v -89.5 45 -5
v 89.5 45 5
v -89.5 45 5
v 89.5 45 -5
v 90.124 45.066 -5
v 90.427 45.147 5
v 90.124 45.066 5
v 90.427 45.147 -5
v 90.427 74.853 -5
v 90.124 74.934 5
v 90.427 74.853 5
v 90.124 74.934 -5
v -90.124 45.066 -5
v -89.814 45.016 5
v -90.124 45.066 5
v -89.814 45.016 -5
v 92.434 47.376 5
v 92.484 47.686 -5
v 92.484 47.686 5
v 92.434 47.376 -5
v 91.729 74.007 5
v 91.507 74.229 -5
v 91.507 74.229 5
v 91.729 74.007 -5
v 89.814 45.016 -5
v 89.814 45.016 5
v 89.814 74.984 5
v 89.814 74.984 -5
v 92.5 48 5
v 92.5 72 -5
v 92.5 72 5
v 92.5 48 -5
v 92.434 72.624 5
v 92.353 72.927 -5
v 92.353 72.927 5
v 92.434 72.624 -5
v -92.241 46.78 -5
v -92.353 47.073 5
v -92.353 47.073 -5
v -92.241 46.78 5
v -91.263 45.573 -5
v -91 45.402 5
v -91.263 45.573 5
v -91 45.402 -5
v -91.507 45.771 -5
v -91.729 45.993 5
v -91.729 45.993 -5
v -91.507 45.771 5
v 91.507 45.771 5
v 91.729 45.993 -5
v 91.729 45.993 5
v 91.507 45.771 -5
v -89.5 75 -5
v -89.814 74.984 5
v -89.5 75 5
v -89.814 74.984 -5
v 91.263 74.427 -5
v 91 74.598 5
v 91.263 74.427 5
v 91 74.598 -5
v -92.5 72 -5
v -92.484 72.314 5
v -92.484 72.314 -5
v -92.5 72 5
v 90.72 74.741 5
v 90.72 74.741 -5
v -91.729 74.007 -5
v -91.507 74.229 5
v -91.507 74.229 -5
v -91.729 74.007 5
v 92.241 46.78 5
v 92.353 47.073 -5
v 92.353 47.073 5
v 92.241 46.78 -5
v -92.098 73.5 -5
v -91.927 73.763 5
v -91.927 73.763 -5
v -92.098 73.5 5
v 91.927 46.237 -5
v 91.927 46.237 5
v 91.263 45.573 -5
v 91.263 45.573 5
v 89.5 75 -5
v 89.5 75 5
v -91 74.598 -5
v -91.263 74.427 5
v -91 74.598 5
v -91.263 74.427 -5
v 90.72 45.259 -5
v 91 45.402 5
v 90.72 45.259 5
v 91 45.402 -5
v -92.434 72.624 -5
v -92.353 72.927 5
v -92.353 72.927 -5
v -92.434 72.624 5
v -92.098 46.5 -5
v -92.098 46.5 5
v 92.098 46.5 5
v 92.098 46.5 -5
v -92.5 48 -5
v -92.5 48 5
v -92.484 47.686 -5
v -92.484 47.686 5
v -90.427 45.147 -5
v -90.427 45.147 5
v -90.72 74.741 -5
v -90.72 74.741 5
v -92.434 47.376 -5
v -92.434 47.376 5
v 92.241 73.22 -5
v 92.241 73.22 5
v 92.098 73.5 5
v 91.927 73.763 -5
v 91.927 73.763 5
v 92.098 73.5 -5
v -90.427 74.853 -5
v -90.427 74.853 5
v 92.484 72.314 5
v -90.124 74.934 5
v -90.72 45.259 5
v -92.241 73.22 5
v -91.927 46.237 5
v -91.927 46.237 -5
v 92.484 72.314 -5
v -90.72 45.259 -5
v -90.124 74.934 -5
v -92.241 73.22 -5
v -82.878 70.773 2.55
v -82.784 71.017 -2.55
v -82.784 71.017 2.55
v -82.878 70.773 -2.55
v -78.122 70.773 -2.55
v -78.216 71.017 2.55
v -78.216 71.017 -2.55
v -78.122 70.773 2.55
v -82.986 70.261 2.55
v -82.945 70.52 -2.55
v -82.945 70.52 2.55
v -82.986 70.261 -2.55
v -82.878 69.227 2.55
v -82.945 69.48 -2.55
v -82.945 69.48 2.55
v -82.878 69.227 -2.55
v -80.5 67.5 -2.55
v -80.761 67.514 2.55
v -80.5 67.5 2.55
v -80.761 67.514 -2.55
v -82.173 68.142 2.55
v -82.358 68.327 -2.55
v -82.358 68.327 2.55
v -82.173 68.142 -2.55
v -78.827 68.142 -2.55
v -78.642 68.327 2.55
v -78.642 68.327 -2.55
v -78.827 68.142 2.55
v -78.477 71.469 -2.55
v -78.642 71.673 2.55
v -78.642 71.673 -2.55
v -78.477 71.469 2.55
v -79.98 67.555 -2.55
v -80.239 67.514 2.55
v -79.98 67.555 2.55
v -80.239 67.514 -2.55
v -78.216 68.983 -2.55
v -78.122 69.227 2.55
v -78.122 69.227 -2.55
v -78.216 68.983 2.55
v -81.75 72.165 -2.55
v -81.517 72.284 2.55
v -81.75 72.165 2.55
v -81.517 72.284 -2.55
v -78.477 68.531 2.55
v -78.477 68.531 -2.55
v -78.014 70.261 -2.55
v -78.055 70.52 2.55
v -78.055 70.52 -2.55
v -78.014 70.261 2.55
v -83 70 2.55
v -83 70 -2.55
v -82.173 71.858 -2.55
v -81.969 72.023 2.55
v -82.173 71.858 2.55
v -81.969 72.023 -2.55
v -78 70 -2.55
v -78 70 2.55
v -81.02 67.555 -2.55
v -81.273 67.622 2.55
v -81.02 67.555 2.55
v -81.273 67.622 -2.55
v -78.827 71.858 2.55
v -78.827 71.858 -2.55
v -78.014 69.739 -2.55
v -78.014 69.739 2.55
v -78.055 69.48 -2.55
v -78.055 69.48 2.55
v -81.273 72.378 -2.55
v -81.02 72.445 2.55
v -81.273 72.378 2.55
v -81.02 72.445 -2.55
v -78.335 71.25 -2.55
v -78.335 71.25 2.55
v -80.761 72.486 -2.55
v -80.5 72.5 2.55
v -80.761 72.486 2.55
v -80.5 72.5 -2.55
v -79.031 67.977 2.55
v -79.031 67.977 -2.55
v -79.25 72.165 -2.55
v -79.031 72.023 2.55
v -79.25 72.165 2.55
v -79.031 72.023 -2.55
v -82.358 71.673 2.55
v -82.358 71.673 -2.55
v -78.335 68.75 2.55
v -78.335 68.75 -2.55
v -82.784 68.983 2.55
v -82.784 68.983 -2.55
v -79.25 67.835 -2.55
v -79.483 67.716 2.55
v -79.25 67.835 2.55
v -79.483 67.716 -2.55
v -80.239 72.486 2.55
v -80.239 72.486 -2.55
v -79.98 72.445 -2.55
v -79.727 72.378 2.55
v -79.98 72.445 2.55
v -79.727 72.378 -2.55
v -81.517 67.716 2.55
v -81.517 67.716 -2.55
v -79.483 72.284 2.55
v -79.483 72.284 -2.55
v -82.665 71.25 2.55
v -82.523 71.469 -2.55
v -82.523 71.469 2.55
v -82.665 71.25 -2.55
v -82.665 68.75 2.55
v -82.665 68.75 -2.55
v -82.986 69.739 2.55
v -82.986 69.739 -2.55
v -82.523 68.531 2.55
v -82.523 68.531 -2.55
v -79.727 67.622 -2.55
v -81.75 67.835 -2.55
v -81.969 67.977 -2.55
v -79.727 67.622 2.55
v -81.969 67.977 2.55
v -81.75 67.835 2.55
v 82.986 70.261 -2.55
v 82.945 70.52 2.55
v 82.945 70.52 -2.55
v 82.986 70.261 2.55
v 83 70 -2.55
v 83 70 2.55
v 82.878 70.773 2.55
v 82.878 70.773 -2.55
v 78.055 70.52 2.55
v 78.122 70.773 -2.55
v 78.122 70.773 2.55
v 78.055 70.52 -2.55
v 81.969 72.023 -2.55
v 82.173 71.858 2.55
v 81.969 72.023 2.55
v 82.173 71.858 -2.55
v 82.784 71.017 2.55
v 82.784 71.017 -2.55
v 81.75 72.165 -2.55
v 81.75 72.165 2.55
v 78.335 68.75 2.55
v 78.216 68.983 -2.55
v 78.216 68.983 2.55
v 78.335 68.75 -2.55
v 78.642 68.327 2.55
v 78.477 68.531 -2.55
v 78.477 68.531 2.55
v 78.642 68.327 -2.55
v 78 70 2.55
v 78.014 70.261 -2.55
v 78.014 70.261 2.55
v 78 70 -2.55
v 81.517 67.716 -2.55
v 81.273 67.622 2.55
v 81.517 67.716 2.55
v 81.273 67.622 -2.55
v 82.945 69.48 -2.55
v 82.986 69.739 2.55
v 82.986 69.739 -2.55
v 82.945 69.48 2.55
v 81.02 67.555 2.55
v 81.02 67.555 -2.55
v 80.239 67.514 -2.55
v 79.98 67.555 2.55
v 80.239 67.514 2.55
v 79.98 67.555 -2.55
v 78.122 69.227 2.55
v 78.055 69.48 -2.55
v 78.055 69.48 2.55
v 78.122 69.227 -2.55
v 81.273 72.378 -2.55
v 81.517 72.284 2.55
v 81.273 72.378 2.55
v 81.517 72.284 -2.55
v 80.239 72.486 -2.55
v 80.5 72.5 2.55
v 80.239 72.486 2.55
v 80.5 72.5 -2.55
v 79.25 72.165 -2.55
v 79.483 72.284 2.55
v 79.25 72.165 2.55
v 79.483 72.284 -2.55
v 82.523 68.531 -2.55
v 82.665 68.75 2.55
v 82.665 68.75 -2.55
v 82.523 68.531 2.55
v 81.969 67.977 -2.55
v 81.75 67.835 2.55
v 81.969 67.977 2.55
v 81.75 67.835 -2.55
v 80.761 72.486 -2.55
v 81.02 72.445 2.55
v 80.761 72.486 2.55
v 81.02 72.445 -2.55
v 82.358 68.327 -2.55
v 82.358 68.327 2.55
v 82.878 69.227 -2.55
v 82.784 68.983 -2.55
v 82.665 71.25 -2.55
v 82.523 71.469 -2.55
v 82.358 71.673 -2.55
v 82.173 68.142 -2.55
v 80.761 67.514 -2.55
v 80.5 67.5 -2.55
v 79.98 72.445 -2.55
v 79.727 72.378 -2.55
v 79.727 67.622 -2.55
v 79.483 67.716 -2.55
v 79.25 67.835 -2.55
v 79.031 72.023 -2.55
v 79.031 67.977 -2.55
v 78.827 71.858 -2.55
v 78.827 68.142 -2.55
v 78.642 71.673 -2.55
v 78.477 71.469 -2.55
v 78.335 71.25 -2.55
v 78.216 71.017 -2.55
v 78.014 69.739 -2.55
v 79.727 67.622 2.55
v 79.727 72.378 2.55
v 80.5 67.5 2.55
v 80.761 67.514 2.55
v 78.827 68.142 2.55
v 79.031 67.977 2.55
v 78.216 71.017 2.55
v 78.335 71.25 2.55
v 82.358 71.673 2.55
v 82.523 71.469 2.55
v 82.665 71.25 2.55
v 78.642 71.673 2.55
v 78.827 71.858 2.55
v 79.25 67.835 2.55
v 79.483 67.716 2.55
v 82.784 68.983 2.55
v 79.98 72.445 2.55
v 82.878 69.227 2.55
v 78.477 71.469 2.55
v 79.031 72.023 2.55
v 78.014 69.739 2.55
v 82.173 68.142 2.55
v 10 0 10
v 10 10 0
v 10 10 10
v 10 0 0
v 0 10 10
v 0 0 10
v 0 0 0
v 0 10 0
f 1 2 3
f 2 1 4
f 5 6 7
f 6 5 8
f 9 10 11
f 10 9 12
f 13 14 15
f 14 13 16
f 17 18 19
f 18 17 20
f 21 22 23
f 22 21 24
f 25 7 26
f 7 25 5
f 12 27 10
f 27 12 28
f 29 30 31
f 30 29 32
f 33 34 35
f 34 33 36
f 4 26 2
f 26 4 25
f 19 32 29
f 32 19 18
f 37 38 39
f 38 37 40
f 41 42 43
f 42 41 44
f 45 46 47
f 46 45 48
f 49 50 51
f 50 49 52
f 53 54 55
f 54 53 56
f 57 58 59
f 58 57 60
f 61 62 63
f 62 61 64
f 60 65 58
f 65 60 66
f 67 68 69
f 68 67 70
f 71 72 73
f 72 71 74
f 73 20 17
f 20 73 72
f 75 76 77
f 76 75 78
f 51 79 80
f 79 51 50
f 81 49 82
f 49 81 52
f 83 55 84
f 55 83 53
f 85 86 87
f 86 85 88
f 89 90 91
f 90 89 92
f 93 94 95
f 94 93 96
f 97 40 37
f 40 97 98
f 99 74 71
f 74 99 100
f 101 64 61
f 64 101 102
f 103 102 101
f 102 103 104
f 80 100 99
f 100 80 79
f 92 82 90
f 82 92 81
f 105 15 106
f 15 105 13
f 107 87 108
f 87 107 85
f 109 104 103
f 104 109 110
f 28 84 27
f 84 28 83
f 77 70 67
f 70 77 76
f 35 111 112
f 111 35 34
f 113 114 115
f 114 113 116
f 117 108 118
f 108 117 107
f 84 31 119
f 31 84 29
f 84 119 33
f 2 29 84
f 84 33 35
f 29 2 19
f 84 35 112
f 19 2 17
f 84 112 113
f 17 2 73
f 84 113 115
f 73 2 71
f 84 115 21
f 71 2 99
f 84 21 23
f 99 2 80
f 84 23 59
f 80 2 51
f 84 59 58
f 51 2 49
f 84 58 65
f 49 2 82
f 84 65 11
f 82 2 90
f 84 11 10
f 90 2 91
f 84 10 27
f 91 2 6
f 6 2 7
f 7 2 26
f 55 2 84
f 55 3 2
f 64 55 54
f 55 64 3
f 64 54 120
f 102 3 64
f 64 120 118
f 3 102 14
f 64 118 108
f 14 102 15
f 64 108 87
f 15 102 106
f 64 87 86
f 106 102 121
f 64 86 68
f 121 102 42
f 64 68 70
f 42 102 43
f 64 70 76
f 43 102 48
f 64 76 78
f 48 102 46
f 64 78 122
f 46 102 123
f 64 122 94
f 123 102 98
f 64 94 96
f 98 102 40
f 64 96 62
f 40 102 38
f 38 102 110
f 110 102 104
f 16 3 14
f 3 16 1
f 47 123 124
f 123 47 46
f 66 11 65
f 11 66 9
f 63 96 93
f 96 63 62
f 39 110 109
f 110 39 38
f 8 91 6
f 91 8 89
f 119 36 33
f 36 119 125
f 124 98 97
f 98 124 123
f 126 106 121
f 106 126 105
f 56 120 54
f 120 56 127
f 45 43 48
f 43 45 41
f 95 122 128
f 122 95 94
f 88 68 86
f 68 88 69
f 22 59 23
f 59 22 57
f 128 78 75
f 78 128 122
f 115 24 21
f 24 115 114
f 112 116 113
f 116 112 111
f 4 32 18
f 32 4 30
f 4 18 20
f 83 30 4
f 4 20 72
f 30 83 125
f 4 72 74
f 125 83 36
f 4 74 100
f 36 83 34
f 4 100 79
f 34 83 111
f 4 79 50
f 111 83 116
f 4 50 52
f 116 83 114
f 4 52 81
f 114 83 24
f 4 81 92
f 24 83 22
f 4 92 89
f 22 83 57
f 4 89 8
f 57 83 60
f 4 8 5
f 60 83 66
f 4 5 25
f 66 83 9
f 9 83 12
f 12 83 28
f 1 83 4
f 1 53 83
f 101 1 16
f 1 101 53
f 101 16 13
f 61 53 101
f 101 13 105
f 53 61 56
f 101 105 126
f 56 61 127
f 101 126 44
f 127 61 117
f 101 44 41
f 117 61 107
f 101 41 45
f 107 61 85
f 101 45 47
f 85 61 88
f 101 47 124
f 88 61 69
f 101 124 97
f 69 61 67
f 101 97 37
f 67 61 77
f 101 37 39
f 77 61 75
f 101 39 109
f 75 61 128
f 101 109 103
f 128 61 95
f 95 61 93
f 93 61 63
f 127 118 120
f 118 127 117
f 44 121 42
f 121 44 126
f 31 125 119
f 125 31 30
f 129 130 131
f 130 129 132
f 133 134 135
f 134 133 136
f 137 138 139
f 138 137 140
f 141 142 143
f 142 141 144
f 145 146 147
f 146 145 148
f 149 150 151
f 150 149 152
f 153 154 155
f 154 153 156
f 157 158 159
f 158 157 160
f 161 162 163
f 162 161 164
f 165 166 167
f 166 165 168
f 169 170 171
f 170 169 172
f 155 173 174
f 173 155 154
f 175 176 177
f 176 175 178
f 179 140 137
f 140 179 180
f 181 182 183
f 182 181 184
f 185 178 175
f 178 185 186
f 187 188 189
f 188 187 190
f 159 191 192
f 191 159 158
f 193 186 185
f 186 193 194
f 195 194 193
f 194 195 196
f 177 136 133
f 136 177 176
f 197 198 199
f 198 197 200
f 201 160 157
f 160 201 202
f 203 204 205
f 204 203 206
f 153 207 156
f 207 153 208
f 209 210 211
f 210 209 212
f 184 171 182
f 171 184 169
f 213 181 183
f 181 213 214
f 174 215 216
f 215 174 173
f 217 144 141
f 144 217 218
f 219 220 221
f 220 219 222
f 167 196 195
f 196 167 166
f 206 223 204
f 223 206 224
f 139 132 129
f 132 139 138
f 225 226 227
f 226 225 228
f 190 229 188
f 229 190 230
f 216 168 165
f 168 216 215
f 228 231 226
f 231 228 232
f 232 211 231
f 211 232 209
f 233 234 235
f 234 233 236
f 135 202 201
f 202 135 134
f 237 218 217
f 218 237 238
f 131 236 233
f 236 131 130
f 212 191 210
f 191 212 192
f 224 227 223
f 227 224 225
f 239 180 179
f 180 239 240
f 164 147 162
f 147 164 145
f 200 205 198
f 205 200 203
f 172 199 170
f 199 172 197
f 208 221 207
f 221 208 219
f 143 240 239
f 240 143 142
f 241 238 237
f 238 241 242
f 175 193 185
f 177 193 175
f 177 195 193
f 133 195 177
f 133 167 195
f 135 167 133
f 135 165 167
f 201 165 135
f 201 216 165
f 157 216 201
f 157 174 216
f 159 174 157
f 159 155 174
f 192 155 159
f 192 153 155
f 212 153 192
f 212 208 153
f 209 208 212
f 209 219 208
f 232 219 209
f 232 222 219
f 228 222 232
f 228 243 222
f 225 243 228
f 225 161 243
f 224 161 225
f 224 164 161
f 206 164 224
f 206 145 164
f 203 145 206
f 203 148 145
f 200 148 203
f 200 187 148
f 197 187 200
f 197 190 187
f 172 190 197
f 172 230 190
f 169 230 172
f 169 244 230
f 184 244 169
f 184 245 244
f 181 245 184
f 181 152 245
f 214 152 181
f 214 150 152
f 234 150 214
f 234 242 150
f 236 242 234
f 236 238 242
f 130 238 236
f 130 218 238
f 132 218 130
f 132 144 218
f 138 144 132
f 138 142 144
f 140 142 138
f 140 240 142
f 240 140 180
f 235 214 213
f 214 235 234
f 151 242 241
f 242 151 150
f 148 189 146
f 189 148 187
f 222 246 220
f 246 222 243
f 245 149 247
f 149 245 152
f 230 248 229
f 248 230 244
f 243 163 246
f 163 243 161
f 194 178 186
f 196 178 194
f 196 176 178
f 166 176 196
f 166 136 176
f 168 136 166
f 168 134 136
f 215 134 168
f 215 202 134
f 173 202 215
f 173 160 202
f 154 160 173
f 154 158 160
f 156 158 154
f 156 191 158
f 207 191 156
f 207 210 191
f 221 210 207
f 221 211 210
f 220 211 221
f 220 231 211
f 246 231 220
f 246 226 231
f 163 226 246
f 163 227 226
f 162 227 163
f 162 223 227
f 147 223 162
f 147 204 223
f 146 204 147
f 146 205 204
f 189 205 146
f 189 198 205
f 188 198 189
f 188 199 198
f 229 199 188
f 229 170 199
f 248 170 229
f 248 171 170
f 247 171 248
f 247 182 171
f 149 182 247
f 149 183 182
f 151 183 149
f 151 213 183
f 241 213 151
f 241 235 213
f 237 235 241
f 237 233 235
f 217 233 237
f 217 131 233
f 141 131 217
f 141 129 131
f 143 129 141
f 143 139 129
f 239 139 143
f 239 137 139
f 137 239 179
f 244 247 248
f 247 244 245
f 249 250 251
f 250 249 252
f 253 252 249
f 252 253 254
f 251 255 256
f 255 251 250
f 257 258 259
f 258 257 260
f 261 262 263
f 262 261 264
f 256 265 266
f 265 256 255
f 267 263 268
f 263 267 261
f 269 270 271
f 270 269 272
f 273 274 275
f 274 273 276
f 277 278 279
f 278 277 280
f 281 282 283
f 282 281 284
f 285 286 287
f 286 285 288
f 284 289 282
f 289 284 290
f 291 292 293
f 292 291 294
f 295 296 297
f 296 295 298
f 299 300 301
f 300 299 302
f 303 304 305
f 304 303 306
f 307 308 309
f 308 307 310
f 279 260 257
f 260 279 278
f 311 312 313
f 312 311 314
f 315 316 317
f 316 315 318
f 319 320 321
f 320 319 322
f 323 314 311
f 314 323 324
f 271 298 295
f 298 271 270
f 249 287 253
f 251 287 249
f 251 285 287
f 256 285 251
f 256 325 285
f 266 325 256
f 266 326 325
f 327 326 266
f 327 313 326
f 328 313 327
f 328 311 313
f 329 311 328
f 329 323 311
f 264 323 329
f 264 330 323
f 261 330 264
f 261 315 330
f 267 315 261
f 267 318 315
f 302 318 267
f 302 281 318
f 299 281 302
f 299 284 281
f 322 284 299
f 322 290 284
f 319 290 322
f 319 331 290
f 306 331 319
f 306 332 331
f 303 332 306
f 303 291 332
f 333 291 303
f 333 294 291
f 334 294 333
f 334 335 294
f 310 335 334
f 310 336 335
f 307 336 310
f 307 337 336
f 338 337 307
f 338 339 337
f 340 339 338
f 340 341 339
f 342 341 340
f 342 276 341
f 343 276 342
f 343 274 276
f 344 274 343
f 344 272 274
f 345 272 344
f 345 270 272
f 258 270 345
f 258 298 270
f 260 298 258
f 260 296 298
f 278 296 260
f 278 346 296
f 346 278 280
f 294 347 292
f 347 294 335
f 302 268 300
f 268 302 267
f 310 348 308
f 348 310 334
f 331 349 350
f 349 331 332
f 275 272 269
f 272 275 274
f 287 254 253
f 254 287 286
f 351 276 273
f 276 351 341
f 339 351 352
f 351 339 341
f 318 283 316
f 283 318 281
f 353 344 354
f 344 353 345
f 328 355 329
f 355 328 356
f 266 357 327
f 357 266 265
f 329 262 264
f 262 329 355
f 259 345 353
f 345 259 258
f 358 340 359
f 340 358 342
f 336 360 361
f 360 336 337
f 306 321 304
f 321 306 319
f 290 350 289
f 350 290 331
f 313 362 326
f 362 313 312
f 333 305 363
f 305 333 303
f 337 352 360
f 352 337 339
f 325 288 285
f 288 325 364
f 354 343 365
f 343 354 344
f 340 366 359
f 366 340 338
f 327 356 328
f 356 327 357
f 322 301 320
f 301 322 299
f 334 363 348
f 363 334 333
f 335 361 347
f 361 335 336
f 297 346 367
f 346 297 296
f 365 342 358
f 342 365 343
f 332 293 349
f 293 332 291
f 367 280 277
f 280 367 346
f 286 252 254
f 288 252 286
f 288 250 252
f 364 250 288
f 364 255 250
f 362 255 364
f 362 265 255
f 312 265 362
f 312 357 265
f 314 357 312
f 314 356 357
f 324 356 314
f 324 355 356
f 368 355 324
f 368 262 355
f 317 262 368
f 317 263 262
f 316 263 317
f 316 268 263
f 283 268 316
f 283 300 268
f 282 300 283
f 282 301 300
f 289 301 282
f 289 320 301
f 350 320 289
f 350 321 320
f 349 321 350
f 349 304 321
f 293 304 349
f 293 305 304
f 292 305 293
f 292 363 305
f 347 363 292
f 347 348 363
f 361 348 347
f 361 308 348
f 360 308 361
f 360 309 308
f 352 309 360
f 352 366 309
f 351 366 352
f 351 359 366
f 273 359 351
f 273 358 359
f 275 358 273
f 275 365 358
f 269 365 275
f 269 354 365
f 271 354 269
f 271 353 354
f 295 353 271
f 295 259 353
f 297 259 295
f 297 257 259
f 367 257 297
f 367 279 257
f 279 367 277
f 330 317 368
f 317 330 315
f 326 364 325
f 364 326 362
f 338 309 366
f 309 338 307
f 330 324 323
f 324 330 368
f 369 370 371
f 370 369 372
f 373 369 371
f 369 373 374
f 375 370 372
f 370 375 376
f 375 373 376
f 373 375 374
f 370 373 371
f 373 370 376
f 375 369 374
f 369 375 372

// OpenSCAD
// Modul til at skabe en rektangel med afrundede hjørner
module rounded_rectangle(bredde, laengde, hoejde, radius, $fn = 60) {
    if (bredde < 2*radius || laengde < 2*radius) {
        echo("FEJL: Bredde eller længde er for lille i forhold til radius. Kan ikke skabe formen.");
    } else {
        minkowski() {
            cube([bredde - 2*radius, laengde - 2*radius, hoejde], center = true);
            // Tilføj center = true til cylinderen
            cylinder(h = hoejde, r = radius, $fn = $fn, center = true); 
        }
    }
}

// Modul til at tilføje huller i et objekt
module add_holes(hul_diameter, hul_afstand_x, hul_afstand_y, hoejde, $fn = 60) {
    difference() {
        children(0); 
        
        // Første hul i øverste venstre hjørne
        translate([
            -hul_afstand_x,
            hul_afstand_y,
            0
        ]) {
            cylinder(h = hoejde + 0.1, r = hul_diameter / 2, $fn = $fn, center = true); // <-- Tilføjet center = true
        }
        
        // Andet hul i øverste højre hjørne
        translate([
            hul_afstand_x,
            hul_afstand_y,
            0
        ]) {
            cylinder(h = hoejde + 0.1, r = hul_diameter / 2, $fn = $fn, center = true); // <-- Tilføjet center = true
        }
    }
}

// Vi samler alle dele med 'union'
union() {
/*
    // Første rektangel uden huller
    rounded_rectangle(bredde = 180, laengde = 40, hoejde = 5, radius = 5);

    // Anden rektangel uden huller, placeret ved siden af
    translate([0, -60, 0]) {
        rounded_rectangle(bredde = 150, laengde = 30, hoejde = 5, radius = 3);
    }
*/    
    // Tredje rektangel med huller
    // Vi bruger 'add_holes' modulet til at modificere rektanglen
    translate([0, 60, 0]) {
        add_holes(hul_diameter = 5, hul_afstand_x = 161/2, hul_afstand_y = 10, hoejde = 5) {
            rounded_rectangle(bredde = 185, laengde = 30, hoejde = 5, radius = 3);
        }
    }
}

cube([10, 10, 10], center = false               );
